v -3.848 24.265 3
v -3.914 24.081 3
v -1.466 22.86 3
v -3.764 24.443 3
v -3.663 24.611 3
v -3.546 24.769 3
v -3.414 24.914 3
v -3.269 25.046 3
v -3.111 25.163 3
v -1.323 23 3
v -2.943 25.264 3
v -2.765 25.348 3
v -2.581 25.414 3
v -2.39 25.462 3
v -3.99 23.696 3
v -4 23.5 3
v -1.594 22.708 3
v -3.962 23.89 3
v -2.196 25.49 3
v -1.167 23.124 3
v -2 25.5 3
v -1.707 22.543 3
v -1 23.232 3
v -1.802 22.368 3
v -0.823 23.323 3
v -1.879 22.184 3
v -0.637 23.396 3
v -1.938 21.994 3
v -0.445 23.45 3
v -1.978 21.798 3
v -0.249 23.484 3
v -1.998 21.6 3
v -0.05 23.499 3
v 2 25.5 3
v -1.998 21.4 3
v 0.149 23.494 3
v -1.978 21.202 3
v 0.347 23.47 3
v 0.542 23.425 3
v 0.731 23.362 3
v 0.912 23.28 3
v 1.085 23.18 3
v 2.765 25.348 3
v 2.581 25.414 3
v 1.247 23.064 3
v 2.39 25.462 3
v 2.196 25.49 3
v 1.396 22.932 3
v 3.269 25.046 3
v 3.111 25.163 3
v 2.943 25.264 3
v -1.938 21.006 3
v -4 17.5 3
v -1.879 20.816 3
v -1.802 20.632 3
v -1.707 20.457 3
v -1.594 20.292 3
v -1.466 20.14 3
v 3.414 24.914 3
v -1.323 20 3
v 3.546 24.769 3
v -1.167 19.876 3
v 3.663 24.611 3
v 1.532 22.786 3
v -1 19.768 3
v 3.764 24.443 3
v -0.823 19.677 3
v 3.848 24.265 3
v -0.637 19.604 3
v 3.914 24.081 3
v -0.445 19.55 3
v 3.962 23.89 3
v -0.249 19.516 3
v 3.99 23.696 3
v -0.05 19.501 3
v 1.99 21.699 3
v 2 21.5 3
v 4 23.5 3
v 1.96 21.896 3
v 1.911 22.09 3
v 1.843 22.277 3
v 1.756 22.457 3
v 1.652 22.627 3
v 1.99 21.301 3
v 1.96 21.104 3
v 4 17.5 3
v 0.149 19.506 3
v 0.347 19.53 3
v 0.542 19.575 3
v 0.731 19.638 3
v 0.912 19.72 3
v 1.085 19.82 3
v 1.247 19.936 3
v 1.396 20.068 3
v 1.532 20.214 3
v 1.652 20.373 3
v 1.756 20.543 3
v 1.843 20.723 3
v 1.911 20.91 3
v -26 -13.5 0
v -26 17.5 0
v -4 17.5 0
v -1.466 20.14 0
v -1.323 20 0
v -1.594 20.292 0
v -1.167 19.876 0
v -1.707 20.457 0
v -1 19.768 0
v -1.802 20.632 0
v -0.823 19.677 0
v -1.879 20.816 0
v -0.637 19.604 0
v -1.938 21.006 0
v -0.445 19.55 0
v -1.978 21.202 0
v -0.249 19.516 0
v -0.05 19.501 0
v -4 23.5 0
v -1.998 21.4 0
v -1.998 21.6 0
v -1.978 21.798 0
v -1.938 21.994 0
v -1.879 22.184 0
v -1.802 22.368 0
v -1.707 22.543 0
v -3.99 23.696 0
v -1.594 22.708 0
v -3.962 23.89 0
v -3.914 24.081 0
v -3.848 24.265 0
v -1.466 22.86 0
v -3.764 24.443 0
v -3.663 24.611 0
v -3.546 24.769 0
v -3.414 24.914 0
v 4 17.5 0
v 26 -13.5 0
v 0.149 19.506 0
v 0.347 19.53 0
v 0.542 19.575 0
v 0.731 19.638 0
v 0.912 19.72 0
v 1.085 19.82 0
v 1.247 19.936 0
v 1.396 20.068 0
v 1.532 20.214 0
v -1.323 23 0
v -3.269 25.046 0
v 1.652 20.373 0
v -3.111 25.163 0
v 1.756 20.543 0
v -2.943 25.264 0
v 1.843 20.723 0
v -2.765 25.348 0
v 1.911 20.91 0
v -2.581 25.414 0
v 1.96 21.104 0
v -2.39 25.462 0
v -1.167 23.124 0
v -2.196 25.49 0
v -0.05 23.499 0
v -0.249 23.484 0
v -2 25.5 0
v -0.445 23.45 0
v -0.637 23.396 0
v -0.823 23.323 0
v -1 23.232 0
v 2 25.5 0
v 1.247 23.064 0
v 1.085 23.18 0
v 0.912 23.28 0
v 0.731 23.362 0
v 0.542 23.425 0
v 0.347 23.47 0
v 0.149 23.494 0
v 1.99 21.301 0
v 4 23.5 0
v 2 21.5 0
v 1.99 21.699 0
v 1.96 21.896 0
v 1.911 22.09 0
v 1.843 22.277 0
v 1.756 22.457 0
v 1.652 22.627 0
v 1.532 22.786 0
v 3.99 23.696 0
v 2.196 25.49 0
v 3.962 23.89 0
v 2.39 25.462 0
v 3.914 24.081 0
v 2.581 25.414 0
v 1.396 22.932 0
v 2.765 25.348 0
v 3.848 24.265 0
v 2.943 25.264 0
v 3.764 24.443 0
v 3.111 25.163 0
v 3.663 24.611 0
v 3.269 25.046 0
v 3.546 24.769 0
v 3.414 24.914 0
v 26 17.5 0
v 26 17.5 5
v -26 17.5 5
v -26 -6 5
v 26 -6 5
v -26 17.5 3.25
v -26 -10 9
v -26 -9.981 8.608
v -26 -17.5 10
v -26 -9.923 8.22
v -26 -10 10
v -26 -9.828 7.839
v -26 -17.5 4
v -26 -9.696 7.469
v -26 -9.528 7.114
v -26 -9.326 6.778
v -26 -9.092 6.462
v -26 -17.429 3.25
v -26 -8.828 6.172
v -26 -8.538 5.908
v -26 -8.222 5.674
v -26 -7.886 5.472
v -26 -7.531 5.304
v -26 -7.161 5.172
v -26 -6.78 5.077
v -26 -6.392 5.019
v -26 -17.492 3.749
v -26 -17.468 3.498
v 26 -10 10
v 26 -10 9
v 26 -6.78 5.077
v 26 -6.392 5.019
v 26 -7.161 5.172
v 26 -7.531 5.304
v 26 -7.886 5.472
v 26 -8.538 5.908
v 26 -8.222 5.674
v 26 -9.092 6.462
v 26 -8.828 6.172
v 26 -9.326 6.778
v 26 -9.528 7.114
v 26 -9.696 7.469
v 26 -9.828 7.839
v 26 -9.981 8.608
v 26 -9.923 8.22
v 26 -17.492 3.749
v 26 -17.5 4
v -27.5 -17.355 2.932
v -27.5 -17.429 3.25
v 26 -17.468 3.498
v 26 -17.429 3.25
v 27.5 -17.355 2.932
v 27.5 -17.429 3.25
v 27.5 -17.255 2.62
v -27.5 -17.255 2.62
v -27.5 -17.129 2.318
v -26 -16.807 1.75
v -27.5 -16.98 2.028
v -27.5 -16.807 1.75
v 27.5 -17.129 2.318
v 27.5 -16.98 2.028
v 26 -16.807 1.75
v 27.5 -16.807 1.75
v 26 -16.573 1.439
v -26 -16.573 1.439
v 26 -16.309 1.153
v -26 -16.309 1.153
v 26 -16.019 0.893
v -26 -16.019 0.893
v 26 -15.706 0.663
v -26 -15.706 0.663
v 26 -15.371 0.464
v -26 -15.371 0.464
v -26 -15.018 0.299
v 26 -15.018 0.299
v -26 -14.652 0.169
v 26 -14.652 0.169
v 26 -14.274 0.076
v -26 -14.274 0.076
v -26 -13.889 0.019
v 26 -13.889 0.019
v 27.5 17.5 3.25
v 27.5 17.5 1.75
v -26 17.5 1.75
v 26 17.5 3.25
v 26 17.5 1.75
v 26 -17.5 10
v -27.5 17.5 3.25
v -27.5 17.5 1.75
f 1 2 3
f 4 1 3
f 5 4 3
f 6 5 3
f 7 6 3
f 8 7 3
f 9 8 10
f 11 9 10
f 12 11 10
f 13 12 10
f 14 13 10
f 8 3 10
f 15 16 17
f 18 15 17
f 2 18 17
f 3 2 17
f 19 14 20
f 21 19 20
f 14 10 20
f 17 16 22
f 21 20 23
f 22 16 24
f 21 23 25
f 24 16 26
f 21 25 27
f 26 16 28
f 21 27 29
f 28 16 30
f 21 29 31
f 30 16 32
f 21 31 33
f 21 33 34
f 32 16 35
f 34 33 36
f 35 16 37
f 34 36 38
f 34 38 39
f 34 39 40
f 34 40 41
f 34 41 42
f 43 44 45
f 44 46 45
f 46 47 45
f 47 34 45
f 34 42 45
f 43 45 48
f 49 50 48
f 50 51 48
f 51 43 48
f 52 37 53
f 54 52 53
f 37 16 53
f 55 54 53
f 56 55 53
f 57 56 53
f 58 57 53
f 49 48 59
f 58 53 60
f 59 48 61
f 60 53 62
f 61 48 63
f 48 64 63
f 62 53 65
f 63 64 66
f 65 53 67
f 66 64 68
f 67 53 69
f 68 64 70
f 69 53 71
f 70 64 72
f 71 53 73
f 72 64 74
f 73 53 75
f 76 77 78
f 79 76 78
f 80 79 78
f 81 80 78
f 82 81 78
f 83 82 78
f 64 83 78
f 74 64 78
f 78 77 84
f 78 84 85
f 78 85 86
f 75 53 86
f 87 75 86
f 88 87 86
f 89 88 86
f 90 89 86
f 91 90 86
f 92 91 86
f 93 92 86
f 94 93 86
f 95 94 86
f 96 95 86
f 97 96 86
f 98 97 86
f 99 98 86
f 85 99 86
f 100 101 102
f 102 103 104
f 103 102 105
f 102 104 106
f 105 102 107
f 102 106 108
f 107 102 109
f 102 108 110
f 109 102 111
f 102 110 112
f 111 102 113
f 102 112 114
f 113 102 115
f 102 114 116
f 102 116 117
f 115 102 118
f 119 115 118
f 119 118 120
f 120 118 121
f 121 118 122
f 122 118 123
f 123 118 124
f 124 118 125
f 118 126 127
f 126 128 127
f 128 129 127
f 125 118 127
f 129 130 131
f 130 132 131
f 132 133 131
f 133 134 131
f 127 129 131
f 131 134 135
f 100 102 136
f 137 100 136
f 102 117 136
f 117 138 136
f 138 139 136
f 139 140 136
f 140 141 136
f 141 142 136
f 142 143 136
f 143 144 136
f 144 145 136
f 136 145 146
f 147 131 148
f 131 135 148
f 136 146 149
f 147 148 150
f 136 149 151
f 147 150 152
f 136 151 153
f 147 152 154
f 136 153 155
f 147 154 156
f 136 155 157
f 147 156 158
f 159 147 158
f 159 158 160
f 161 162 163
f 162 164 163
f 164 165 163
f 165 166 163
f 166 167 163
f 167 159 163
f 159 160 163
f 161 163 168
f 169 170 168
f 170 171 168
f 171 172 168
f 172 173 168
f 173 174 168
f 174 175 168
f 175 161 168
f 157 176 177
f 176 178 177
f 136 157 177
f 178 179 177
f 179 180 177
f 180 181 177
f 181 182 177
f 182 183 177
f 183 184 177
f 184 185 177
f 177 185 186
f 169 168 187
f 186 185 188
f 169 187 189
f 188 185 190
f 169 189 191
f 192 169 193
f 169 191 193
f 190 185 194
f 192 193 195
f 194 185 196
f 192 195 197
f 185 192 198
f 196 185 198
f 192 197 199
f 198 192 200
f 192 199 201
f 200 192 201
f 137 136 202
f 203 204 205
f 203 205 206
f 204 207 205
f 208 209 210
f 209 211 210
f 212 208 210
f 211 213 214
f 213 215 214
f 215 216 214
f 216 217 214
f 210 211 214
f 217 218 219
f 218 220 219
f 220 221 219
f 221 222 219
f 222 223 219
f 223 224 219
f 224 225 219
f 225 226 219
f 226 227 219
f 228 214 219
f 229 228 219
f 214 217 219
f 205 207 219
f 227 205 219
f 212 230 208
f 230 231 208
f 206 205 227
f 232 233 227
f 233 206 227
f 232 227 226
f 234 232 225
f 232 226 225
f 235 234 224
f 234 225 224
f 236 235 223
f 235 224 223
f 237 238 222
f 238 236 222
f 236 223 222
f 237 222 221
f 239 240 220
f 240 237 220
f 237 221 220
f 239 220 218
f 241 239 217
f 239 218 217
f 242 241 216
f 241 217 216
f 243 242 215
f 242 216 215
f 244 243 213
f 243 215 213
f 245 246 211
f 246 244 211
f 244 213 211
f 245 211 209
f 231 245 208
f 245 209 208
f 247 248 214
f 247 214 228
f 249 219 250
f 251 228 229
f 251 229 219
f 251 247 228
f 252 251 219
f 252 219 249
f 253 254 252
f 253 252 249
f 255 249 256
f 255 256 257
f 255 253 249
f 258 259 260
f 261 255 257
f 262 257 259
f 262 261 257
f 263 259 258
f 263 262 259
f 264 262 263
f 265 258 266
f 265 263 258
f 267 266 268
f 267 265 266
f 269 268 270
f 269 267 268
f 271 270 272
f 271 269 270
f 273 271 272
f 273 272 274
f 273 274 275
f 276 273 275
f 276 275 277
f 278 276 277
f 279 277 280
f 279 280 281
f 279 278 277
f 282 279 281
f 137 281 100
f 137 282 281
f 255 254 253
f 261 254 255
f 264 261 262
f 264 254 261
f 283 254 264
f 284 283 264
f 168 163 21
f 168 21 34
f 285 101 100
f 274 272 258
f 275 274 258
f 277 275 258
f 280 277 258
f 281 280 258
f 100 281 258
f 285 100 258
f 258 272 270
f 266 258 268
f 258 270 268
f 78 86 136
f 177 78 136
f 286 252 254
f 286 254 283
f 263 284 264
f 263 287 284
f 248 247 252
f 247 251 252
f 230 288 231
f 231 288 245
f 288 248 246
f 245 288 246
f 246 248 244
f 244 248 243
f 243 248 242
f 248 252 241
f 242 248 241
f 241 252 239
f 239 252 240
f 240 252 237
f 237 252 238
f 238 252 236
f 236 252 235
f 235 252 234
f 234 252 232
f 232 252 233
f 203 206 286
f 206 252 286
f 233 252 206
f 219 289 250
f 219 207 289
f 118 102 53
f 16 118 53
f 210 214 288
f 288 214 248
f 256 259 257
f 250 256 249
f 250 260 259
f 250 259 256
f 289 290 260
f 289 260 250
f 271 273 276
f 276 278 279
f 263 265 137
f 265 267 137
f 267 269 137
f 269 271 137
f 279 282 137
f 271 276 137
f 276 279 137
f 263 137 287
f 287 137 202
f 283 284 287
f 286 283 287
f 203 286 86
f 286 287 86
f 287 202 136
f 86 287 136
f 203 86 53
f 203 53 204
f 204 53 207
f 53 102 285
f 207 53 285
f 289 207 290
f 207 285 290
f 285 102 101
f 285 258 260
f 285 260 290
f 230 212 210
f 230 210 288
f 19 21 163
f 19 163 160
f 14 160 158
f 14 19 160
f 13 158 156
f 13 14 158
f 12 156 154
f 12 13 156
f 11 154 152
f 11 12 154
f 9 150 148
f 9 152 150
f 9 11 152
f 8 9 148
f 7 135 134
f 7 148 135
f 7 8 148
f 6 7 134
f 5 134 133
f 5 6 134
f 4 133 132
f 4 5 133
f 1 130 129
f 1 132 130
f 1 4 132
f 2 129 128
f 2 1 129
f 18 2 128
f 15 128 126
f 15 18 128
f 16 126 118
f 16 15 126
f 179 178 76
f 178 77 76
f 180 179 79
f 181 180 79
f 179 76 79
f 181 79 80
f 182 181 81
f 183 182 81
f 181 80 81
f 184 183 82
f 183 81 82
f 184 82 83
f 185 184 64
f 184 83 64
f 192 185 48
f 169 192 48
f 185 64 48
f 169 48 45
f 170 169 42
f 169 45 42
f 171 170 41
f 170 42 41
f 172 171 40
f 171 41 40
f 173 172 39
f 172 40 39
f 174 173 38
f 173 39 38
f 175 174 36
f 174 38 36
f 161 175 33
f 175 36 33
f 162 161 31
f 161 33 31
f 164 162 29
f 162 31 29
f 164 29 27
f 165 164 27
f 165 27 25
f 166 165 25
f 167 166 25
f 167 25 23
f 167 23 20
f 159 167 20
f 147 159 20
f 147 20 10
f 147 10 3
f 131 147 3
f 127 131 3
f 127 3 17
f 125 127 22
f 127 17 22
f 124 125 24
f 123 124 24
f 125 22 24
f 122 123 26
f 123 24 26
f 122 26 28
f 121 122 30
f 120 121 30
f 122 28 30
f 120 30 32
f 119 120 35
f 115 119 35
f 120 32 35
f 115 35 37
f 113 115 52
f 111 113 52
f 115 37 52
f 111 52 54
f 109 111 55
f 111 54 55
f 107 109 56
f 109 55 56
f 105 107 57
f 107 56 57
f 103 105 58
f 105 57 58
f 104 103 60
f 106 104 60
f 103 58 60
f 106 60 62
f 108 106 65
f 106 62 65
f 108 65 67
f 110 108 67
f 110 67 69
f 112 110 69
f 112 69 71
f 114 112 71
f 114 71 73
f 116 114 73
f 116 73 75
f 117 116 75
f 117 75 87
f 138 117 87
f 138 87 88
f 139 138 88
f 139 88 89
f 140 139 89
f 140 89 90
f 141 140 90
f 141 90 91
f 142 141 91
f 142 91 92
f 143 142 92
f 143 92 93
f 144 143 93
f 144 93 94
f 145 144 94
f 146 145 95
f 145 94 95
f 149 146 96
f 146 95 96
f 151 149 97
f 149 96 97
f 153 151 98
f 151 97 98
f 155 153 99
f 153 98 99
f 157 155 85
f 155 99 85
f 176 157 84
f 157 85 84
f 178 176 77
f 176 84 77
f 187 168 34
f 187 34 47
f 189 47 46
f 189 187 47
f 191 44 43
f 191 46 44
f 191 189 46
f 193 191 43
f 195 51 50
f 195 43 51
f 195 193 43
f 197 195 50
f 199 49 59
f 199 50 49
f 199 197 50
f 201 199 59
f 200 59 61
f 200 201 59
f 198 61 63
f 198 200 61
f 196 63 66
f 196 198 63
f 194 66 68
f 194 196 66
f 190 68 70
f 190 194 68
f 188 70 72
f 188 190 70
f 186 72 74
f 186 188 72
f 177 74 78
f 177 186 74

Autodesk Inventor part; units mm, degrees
ref_plane "YZ Plane" through (0, 0, 0) normal (1, 0, 0) x (0, 1, 0)
ref_plane "XZ Plane" through (0, 0, 0) normal (0, 1, 0) x (-1, 0, 0)
ref_plane "XY Plane" through (0, 0, 0) normal (0, 0, 1) x (1, 0, 0)
sketch "Esquisse2" plane through (0, 0, 0) normal (0, 0, 1) x (1, 0, 0)
  line L0 (-26, -17.5) -> (26, -17.5)
  line L1 (26, -17.5) -> (26, 17.5)
  line L2 (26, 17.5) -> (-26, 17.5)
  line L3 (-26, 17.5) -> (-26, -17.5)
  line L4 (-26, -17.5) -> (26, 17.5) construction
  line L5 (26, -17.5) -> (-26, 17.5) construction
  point P0 (0, 0)
  dimension "d0" = 52
  dimension "d1" = 35
extrude "Extrusion1" add sketch "Esquisse2" along normal blind 5
sketch "Esquisse3" plane through (26, -17.5, 0) normal (1, 0, 0) x (0, 0, -1)
  line L0 (0, 0) -> (0, 35) construction
  line L1 (0, 35) -> (-5, 35) construction
  line L2 (-5, 0) -> (-5, 35) construction
  line L3 (0, 0) -> (-5, 0) construction
  line L4 (0, 17.5) -> (-2.5, 17.5) construction
  line L5 (-1.75, 0) -> (-3.25, 0)
  line L6 (-3.25, 0) -> (-3.25, 35)
  line L7 (-3.25, 35) -> (-1.75, 35)
  line L8 (-1.75, 35) -> (-1.75, 0)
  line L9 (-1.75, 0) -> (-3.25, 35) construction
  line L10 (-3.25, 0) -> (-1.75, 35) construction
  dimension "d4" = 2.5
  dimension "d5" = 1.5
extrude "Extrusion2" add sketch "Esquisse3" along normal blind 1.5
mirror "Symétrie1" about plane through (0, 0, 0) normal (1, 0, 0) of "Extrusion2"
sketch "Esquisse4" plane through (0, 0, 5) normal (0, 0, 1) x (1, 0, 0)
  line L0 (-26, 17.5) -> (-26, -17.5) construction
  line L1 (-26, -17.5) -> (26, -17.5) construction
  line L2 (26, -17.5) -> (26, 17.5) construction
  line L3 (26, 17.5) -> (-26, 17.5) construction
  line L4 (-26, -17.5) -> (26, -17.5)
  line L5 (26, -17.5) -> (26, -10)
  line L6 (26, -10) -> (-26, -10)
  line L7 (-26, -10) -> (-26, -17.5)
  point P0 (0, 0)
  dimension "d8" = 7.5
extrude "Extrusion3" add sketch "Esquisse4" along normal blind 5
sketch "Esquisse5" plane through (-26, 17.5, 0) normal (0, 1, 0) x (1, 0, 0)
  line L0 (52, 0) -> (0, 0) construction
  line L1 (0, 0) -> (0, -1.75) construction
  line L2 (0, -1.75) -> (-1.5, -1.75) construction
  line L3 (-1.5, -1.75) -> (-1.5, -3.25) construction
  line L4 (0, -3.25) -> (-1.5, -3.25) construction
  line L5 (0, -3.25) -> (0, -5) construction
  line L6 (52, -5) -> (0, -5) construction
  line L7 (52, -3.25) -> (52, -5) construction
  line L8 (52, -3.25) -> (53.5, -3.25) construction
  line L9 (53.5, -1.75) -> (53.5, -3.25) construction
  line L10 (52, -1.75) -> (53.5, -1.75) construction
  line L11 (52, 0) -> (52, -1.75) construction
  line L12 (26, 2) -> (26, -12) construction
  line L13 (-12.5, 0) -> (64.5, 0) construction
  line L14 (26, 0) -> (30, 0) construction
  line L15 (30, 0) -> (22, 0)
  line L16 (22, 0) -> (22, -3)
  line L17 (22, -3) -> (30, -3)
  line L18 (30, -3) -> (30, 0)
  dimension "d11" = 4
  dimension "d12" = 8
  dimension "d13" = 3
extrude "Extrusion4" add sketch "Esquisse5" along normal blind 8
fillet "Congé1" radius 2 2 edges at (4, 25.5, 1.5) (-4, 25.5, 1.5)
fillet "Congé1" radius 4 2 edges at (0, -17.5, 0) (0, -10, 5)
sketch "Esquisse6" plane through (-4, 17.5, 3) normal (0, 0, 1) x (1, 0, 0)
  line L0 (30, -23.5) -> (-22, -23.5) construction
  line L1 (30, -23.5) -> (30, 0) construction
  line L2 (30, 0) -> (-22, 0) construction
  line L3 (-22, 0) -> (-22, -23.5) construction
  arc A0 (2, 8) -> (0, 6) centre (2, 6) ccw construction
  line L4 (0, 0) -> (0, 6) construction
  line L5 (8, 0) -> (0, 0) construction
  line L6 (8, 0) -> (8, 6) construction
  arc A1 (8, 6) -> (6, 8) centre (6, 6) ccw construction
  line L7 (2, 8) -> (6, 8) construction
  line L8 (4, 0) -> (4, 4) construction
  circle A2 centre (4, 4) radius 2
  point P0 (4, -17.5)
  dimension "d18" = 4
  dimension "d19" = 4
extrude "Extrusion5" cut sketch "Esquisse6" against normal through all
properties part number "A3_BatteriesTray" material "Plastique ABS"
